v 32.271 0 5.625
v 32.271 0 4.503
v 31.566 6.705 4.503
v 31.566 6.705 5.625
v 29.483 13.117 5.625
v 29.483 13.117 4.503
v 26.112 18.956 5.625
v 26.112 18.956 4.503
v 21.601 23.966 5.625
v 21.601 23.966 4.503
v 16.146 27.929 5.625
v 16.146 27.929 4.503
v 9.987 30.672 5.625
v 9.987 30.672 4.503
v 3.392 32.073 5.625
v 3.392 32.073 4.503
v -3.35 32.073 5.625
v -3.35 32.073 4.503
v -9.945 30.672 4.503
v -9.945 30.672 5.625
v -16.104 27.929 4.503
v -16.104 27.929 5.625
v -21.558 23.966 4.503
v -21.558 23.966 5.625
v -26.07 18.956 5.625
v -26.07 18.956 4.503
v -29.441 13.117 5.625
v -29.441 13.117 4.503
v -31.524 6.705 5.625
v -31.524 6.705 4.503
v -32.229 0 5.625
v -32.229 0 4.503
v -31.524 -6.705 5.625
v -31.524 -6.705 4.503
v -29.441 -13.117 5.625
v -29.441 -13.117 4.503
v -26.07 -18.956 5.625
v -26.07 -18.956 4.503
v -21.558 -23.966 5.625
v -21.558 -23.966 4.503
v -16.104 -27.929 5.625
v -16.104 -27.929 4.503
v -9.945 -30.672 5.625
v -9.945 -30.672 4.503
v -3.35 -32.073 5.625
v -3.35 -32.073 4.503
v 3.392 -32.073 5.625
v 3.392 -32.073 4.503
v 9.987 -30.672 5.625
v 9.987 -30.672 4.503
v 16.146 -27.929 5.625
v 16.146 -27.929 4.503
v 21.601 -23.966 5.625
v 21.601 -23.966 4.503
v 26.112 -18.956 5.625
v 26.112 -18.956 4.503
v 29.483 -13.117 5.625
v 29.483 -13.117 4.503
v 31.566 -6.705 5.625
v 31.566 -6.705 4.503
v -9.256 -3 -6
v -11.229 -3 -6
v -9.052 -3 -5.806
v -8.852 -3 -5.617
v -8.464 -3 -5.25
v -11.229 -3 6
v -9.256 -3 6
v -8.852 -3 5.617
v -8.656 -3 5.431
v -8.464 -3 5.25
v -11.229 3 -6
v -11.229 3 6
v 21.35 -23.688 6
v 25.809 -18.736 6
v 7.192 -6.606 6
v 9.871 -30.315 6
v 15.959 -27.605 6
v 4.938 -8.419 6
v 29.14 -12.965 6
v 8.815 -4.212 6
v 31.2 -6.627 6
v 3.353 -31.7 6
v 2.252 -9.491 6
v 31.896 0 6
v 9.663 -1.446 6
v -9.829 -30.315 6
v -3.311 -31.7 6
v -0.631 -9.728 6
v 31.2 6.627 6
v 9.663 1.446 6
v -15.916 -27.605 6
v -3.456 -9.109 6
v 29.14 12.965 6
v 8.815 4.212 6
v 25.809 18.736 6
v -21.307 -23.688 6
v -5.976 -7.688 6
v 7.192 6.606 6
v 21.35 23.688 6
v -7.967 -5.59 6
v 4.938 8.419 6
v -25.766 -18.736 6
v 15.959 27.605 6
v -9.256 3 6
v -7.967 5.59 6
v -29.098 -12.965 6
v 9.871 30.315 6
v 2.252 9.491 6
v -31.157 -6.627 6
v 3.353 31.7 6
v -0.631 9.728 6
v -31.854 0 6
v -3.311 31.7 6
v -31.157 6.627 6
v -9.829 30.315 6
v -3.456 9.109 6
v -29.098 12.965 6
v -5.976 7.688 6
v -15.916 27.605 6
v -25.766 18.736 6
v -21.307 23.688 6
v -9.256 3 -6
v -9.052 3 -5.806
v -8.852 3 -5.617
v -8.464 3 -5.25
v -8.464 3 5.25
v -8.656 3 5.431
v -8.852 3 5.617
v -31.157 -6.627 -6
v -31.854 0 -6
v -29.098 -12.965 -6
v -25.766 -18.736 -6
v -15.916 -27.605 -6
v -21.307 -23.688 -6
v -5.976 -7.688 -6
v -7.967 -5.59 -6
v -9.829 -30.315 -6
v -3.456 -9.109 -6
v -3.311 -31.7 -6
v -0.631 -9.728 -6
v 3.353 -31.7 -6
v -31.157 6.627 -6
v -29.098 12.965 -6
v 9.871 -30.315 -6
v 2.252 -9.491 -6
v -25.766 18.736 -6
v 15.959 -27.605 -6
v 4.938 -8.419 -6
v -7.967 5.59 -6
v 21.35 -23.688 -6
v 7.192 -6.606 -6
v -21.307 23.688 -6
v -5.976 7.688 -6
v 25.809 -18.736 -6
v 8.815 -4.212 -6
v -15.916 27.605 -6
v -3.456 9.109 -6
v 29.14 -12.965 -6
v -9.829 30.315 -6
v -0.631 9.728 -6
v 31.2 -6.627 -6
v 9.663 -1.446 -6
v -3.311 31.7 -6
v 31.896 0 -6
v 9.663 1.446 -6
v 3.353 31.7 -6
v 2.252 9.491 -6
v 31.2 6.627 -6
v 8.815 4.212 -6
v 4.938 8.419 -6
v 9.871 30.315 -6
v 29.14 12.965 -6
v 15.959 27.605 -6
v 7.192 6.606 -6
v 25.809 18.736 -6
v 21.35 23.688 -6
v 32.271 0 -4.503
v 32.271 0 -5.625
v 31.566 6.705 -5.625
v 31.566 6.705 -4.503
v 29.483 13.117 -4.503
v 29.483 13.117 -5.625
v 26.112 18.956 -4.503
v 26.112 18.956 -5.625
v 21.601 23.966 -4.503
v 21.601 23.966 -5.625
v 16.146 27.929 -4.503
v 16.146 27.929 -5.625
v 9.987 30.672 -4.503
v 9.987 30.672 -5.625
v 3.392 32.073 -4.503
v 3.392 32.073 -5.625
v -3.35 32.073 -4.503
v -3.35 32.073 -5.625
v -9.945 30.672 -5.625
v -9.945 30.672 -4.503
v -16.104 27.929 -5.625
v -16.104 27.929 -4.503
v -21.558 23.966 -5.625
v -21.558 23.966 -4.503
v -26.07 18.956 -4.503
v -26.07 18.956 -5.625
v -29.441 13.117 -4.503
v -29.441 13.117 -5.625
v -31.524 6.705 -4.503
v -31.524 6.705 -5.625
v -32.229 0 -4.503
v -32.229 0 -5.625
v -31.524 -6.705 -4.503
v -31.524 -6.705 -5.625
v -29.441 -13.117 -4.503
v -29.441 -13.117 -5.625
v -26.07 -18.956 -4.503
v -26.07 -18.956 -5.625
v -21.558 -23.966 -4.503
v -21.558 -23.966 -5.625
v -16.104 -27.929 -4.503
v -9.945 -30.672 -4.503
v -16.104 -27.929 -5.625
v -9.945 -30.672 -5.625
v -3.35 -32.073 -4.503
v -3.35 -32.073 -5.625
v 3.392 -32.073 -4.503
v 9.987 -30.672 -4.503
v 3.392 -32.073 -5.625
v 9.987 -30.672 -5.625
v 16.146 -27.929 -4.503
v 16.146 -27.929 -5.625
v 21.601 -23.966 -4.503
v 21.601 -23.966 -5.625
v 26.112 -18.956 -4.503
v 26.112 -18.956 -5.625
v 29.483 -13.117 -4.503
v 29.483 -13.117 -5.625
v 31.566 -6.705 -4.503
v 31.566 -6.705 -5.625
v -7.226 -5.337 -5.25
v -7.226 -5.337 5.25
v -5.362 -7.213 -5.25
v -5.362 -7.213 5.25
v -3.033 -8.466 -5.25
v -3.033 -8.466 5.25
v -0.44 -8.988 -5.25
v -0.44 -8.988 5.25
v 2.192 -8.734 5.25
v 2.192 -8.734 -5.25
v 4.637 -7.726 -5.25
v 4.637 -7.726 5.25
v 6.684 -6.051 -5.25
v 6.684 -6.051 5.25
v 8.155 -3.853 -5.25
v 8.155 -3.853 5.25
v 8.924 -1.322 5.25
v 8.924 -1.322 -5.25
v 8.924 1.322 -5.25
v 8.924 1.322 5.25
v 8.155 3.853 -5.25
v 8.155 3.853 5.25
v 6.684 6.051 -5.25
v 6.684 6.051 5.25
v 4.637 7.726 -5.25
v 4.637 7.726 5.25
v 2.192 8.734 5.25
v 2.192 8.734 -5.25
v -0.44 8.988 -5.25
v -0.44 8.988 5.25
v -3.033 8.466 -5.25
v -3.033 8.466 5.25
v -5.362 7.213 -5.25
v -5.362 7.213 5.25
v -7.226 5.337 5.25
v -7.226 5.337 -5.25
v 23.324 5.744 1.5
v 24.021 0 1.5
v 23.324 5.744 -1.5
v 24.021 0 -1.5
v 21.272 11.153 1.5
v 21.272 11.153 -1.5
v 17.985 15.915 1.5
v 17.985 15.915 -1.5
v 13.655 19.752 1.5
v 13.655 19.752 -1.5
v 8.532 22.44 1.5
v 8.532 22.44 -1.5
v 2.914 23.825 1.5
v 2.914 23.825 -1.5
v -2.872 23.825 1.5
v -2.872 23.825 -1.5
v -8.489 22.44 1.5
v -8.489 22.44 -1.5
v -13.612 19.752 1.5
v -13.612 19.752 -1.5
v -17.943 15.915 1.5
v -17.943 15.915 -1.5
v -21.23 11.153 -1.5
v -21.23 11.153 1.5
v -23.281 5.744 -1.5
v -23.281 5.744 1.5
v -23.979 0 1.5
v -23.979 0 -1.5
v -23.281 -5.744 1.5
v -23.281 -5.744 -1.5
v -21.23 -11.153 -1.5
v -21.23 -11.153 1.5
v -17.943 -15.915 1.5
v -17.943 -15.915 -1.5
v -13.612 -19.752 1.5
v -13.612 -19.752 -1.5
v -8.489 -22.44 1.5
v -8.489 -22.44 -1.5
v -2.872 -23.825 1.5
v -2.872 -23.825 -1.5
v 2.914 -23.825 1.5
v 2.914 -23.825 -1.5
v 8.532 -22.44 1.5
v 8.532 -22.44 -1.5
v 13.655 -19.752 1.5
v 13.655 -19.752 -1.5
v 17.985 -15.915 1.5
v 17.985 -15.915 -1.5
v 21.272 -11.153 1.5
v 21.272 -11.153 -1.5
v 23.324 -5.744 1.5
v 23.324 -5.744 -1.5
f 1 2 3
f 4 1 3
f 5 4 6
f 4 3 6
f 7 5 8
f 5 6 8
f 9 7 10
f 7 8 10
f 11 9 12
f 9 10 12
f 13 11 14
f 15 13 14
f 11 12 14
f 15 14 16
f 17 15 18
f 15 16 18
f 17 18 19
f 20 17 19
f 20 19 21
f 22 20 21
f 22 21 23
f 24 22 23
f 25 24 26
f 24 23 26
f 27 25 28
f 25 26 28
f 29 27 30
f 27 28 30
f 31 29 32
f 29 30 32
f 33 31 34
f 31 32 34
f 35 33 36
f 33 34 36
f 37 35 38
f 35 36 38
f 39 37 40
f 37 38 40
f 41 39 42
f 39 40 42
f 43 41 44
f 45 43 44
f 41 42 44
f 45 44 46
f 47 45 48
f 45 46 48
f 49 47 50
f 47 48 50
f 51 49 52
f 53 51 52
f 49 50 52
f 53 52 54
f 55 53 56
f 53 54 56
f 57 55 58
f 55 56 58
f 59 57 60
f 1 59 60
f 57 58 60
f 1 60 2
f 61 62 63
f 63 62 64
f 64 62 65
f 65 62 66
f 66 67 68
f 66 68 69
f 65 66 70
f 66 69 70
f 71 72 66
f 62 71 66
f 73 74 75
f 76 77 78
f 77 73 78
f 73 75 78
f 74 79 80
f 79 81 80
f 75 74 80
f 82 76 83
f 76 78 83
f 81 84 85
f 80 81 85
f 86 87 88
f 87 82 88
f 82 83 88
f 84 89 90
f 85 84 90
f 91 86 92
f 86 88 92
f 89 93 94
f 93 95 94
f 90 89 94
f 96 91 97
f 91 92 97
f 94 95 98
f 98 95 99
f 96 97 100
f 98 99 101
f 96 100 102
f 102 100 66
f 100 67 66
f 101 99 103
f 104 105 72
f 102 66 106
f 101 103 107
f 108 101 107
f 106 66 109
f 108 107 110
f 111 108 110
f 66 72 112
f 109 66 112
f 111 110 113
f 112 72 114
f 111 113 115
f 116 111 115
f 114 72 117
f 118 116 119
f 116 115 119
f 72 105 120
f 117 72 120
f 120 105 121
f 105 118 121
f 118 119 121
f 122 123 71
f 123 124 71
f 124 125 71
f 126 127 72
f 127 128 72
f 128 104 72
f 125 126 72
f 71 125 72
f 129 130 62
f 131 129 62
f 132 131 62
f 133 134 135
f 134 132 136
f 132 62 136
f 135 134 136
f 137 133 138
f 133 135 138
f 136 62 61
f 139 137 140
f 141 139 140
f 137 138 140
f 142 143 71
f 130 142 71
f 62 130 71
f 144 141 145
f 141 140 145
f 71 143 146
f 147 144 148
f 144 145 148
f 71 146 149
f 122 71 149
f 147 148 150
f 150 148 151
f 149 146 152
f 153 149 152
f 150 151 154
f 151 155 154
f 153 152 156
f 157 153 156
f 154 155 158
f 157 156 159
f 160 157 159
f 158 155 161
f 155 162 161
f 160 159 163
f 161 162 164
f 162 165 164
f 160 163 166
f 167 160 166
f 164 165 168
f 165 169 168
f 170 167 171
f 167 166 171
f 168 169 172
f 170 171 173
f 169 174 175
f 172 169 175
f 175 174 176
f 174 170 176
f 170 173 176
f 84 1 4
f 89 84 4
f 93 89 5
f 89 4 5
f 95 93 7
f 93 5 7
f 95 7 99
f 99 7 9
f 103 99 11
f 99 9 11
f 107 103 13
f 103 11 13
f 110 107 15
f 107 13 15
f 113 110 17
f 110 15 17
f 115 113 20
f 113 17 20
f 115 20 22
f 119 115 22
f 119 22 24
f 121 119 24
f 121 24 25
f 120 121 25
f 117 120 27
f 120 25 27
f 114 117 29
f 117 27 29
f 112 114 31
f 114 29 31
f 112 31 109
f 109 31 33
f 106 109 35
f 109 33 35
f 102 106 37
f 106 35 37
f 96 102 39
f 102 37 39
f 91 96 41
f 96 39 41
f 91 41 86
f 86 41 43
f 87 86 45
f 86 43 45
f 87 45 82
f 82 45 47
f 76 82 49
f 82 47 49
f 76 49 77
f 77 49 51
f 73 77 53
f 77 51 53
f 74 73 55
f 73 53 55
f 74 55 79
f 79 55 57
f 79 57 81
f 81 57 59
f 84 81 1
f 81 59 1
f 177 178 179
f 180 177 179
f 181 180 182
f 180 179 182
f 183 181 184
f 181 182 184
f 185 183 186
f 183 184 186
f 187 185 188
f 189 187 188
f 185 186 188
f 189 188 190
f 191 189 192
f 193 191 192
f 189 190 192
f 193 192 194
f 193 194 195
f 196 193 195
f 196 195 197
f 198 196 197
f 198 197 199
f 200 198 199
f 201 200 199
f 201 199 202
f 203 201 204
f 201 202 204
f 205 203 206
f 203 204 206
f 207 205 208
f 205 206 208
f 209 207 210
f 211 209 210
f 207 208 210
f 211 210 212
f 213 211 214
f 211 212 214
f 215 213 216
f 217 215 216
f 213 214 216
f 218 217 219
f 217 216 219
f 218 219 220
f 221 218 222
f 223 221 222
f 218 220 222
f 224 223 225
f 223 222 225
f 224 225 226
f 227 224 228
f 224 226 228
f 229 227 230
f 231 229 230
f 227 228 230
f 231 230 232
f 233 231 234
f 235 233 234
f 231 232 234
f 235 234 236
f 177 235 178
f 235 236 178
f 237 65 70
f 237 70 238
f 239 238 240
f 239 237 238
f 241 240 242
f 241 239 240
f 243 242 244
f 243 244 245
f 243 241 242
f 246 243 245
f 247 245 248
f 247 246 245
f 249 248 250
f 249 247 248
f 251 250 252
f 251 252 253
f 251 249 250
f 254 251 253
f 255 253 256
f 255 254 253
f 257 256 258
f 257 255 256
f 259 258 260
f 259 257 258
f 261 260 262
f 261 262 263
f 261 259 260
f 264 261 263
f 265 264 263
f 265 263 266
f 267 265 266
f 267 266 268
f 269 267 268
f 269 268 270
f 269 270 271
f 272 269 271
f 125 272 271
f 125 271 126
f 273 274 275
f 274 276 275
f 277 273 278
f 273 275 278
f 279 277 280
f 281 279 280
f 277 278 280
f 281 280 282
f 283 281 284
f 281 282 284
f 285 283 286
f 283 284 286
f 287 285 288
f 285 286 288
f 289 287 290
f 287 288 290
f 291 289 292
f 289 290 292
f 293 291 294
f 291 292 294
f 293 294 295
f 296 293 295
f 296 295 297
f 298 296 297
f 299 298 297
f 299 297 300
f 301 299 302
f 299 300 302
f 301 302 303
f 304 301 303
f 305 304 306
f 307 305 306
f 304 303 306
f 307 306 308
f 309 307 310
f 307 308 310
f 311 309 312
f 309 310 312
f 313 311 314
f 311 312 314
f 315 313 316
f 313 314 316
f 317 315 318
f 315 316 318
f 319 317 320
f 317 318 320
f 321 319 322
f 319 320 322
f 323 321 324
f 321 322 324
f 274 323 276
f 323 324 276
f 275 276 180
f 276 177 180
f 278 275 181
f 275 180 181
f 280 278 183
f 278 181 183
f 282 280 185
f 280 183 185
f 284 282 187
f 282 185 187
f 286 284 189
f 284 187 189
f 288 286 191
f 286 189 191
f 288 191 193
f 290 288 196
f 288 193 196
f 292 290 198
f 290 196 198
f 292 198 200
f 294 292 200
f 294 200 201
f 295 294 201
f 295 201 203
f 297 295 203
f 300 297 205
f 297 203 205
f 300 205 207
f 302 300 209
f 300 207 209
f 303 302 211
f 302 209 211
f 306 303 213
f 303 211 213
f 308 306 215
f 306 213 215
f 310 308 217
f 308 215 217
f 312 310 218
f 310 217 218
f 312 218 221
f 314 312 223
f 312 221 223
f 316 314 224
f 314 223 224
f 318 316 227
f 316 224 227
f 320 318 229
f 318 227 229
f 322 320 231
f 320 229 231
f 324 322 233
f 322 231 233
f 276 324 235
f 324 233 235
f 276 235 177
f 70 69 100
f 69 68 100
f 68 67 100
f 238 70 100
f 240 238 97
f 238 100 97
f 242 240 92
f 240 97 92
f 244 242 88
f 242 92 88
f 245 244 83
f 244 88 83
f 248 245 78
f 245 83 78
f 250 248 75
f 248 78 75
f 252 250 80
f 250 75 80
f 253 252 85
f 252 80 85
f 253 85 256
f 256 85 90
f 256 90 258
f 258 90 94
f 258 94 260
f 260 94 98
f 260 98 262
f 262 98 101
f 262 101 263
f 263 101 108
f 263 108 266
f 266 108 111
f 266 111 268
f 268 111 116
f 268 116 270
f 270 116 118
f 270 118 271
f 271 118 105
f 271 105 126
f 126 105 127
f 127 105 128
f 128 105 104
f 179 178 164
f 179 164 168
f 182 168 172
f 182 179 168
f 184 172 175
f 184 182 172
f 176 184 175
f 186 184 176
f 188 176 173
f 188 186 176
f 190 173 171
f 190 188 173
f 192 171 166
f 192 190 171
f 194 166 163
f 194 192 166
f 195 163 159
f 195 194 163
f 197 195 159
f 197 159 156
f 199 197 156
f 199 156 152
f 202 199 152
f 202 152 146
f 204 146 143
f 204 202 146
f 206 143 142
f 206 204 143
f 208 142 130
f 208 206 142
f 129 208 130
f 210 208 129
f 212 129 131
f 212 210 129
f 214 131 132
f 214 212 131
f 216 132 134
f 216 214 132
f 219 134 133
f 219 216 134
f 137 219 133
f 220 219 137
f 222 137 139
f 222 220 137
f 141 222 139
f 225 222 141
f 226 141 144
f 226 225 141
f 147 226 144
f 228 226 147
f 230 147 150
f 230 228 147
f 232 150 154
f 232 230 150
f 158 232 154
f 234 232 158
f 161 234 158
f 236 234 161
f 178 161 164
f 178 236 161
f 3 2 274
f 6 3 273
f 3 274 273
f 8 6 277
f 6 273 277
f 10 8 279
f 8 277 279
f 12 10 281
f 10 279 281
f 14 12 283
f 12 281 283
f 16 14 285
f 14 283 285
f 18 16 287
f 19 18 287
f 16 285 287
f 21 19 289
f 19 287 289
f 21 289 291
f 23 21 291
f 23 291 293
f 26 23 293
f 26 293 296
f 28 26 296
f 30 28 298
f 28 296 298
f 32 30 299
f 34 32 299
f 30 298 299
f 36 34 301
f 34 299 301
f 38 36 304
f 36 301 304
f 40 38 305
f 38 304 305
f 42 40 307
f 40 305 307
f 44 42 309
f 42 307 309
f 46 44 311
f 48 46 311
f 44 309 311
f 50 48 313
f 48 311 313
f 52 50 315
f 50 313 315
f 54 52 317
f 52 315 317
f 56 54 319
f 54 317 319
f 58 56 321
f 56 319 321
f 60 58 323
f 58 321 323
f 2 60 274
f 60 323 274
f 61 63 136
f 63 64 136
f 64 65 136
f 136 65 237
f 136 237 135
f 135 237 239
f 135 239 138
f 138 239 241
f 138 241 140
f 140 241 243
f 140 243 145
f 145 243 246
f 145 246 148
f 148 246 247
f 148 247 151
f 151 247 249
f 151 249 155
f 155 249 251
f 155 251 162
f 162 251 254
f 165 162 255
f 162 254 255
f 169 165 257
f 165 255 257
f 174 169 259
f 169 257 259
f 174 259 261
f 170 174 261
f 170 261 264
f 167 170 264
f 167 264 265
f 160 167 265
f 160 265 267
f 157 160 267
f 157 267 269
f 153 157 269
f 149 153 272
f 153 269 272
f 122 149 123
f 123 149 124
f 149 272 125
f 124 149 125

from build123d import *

# Parameters (mm, degrees)
CUT_EXTRUDE1_DEPTH = 17
SKETCH3_W          = 12
SKETCH3_H          = 16
CHAMFER1_SIZE2     = 1.000000021
CHAMFER1_SIZE      = 1.000000018
CHAMFER2_SIZE      = 0.5
SCALE1_SCALE       = 0.75


with BuildPart() as part:
    # Sketch1 → Revolve1 (revolve)
    with BuildSketch(Plane(origin=(0, 0, 0), x_dir=(1, 0, 0), z_dir=(0, 1, 0))):
        Polygon((43, 8), (0, 8), (0, -8), (43, -8), (43, -6.003672577), (32, -2), (32, 2), (43, 6.003672577), align=None)
    revolve(axis=Axis((0, 0, -8), (0, 0, 1)))

    # Sketch2 → Cut-Extrude1 (cut, through all)
    with BuildSketch(Plane.XY.offset(8)):
        with BuildLine():
            Line((-15, -4), (-11.313708499, -4))
            ThreePointArc((-11.313708499, -4), (-12, -1e-09), (-11.313708499, 3.999999999))
            Line((-11.313708499, 3.999999999), (-15, 3.999999999))
            Line((-15, 3.999999999), (-15, -4))
        make_face()
    extrude(amount=-CUT_EXTRUDE1_DEPTH, mode=Mode.SUBTRACT)

    # Sketch3 → Cut-Revolve1 (revolve, cut)
    with BuildSketch(Plane(origin=(0, 0, 0), x_dir=(1, 0, 0), z_dir=(0, 1, 0))):
        with Locations((6, 0)):
            Rectangle(SKETCH3_W, SKETCH3_H)
    revolve(axis=Axis((0, 0, -8), (0, 0, 1)), mode=Mode.SUBTRACT)

    # Chamfer1
    chamfer1_edges = [part.edges().sort_by_distance(p)[0] for p in [
        (12, 1e-09, -8),
        (12, 1e-09, 8),
    ]]
    chamfer(chamfer1_edges, length=CHAMFER1_SIZE, length2=CHAMFER1_SIZE2)

    # Chamfer2
    chamfer2_edges = [part.edges().sort_by_distance(p)[0] for p in [
        (-43, 0, 8),
        (-43, 0, -8),
    ]]
    chamfer(chamfer2_edges, length=CHAMFER2_SIZE)


with BuildPart() as part_1:
    # Scale1: scaled about (0.084922045, 0, 0)
    add(part.part.scale(SCALE1_SCALE).moved(Location((0.021230511, 0, 0))))


solid = part_1.part
